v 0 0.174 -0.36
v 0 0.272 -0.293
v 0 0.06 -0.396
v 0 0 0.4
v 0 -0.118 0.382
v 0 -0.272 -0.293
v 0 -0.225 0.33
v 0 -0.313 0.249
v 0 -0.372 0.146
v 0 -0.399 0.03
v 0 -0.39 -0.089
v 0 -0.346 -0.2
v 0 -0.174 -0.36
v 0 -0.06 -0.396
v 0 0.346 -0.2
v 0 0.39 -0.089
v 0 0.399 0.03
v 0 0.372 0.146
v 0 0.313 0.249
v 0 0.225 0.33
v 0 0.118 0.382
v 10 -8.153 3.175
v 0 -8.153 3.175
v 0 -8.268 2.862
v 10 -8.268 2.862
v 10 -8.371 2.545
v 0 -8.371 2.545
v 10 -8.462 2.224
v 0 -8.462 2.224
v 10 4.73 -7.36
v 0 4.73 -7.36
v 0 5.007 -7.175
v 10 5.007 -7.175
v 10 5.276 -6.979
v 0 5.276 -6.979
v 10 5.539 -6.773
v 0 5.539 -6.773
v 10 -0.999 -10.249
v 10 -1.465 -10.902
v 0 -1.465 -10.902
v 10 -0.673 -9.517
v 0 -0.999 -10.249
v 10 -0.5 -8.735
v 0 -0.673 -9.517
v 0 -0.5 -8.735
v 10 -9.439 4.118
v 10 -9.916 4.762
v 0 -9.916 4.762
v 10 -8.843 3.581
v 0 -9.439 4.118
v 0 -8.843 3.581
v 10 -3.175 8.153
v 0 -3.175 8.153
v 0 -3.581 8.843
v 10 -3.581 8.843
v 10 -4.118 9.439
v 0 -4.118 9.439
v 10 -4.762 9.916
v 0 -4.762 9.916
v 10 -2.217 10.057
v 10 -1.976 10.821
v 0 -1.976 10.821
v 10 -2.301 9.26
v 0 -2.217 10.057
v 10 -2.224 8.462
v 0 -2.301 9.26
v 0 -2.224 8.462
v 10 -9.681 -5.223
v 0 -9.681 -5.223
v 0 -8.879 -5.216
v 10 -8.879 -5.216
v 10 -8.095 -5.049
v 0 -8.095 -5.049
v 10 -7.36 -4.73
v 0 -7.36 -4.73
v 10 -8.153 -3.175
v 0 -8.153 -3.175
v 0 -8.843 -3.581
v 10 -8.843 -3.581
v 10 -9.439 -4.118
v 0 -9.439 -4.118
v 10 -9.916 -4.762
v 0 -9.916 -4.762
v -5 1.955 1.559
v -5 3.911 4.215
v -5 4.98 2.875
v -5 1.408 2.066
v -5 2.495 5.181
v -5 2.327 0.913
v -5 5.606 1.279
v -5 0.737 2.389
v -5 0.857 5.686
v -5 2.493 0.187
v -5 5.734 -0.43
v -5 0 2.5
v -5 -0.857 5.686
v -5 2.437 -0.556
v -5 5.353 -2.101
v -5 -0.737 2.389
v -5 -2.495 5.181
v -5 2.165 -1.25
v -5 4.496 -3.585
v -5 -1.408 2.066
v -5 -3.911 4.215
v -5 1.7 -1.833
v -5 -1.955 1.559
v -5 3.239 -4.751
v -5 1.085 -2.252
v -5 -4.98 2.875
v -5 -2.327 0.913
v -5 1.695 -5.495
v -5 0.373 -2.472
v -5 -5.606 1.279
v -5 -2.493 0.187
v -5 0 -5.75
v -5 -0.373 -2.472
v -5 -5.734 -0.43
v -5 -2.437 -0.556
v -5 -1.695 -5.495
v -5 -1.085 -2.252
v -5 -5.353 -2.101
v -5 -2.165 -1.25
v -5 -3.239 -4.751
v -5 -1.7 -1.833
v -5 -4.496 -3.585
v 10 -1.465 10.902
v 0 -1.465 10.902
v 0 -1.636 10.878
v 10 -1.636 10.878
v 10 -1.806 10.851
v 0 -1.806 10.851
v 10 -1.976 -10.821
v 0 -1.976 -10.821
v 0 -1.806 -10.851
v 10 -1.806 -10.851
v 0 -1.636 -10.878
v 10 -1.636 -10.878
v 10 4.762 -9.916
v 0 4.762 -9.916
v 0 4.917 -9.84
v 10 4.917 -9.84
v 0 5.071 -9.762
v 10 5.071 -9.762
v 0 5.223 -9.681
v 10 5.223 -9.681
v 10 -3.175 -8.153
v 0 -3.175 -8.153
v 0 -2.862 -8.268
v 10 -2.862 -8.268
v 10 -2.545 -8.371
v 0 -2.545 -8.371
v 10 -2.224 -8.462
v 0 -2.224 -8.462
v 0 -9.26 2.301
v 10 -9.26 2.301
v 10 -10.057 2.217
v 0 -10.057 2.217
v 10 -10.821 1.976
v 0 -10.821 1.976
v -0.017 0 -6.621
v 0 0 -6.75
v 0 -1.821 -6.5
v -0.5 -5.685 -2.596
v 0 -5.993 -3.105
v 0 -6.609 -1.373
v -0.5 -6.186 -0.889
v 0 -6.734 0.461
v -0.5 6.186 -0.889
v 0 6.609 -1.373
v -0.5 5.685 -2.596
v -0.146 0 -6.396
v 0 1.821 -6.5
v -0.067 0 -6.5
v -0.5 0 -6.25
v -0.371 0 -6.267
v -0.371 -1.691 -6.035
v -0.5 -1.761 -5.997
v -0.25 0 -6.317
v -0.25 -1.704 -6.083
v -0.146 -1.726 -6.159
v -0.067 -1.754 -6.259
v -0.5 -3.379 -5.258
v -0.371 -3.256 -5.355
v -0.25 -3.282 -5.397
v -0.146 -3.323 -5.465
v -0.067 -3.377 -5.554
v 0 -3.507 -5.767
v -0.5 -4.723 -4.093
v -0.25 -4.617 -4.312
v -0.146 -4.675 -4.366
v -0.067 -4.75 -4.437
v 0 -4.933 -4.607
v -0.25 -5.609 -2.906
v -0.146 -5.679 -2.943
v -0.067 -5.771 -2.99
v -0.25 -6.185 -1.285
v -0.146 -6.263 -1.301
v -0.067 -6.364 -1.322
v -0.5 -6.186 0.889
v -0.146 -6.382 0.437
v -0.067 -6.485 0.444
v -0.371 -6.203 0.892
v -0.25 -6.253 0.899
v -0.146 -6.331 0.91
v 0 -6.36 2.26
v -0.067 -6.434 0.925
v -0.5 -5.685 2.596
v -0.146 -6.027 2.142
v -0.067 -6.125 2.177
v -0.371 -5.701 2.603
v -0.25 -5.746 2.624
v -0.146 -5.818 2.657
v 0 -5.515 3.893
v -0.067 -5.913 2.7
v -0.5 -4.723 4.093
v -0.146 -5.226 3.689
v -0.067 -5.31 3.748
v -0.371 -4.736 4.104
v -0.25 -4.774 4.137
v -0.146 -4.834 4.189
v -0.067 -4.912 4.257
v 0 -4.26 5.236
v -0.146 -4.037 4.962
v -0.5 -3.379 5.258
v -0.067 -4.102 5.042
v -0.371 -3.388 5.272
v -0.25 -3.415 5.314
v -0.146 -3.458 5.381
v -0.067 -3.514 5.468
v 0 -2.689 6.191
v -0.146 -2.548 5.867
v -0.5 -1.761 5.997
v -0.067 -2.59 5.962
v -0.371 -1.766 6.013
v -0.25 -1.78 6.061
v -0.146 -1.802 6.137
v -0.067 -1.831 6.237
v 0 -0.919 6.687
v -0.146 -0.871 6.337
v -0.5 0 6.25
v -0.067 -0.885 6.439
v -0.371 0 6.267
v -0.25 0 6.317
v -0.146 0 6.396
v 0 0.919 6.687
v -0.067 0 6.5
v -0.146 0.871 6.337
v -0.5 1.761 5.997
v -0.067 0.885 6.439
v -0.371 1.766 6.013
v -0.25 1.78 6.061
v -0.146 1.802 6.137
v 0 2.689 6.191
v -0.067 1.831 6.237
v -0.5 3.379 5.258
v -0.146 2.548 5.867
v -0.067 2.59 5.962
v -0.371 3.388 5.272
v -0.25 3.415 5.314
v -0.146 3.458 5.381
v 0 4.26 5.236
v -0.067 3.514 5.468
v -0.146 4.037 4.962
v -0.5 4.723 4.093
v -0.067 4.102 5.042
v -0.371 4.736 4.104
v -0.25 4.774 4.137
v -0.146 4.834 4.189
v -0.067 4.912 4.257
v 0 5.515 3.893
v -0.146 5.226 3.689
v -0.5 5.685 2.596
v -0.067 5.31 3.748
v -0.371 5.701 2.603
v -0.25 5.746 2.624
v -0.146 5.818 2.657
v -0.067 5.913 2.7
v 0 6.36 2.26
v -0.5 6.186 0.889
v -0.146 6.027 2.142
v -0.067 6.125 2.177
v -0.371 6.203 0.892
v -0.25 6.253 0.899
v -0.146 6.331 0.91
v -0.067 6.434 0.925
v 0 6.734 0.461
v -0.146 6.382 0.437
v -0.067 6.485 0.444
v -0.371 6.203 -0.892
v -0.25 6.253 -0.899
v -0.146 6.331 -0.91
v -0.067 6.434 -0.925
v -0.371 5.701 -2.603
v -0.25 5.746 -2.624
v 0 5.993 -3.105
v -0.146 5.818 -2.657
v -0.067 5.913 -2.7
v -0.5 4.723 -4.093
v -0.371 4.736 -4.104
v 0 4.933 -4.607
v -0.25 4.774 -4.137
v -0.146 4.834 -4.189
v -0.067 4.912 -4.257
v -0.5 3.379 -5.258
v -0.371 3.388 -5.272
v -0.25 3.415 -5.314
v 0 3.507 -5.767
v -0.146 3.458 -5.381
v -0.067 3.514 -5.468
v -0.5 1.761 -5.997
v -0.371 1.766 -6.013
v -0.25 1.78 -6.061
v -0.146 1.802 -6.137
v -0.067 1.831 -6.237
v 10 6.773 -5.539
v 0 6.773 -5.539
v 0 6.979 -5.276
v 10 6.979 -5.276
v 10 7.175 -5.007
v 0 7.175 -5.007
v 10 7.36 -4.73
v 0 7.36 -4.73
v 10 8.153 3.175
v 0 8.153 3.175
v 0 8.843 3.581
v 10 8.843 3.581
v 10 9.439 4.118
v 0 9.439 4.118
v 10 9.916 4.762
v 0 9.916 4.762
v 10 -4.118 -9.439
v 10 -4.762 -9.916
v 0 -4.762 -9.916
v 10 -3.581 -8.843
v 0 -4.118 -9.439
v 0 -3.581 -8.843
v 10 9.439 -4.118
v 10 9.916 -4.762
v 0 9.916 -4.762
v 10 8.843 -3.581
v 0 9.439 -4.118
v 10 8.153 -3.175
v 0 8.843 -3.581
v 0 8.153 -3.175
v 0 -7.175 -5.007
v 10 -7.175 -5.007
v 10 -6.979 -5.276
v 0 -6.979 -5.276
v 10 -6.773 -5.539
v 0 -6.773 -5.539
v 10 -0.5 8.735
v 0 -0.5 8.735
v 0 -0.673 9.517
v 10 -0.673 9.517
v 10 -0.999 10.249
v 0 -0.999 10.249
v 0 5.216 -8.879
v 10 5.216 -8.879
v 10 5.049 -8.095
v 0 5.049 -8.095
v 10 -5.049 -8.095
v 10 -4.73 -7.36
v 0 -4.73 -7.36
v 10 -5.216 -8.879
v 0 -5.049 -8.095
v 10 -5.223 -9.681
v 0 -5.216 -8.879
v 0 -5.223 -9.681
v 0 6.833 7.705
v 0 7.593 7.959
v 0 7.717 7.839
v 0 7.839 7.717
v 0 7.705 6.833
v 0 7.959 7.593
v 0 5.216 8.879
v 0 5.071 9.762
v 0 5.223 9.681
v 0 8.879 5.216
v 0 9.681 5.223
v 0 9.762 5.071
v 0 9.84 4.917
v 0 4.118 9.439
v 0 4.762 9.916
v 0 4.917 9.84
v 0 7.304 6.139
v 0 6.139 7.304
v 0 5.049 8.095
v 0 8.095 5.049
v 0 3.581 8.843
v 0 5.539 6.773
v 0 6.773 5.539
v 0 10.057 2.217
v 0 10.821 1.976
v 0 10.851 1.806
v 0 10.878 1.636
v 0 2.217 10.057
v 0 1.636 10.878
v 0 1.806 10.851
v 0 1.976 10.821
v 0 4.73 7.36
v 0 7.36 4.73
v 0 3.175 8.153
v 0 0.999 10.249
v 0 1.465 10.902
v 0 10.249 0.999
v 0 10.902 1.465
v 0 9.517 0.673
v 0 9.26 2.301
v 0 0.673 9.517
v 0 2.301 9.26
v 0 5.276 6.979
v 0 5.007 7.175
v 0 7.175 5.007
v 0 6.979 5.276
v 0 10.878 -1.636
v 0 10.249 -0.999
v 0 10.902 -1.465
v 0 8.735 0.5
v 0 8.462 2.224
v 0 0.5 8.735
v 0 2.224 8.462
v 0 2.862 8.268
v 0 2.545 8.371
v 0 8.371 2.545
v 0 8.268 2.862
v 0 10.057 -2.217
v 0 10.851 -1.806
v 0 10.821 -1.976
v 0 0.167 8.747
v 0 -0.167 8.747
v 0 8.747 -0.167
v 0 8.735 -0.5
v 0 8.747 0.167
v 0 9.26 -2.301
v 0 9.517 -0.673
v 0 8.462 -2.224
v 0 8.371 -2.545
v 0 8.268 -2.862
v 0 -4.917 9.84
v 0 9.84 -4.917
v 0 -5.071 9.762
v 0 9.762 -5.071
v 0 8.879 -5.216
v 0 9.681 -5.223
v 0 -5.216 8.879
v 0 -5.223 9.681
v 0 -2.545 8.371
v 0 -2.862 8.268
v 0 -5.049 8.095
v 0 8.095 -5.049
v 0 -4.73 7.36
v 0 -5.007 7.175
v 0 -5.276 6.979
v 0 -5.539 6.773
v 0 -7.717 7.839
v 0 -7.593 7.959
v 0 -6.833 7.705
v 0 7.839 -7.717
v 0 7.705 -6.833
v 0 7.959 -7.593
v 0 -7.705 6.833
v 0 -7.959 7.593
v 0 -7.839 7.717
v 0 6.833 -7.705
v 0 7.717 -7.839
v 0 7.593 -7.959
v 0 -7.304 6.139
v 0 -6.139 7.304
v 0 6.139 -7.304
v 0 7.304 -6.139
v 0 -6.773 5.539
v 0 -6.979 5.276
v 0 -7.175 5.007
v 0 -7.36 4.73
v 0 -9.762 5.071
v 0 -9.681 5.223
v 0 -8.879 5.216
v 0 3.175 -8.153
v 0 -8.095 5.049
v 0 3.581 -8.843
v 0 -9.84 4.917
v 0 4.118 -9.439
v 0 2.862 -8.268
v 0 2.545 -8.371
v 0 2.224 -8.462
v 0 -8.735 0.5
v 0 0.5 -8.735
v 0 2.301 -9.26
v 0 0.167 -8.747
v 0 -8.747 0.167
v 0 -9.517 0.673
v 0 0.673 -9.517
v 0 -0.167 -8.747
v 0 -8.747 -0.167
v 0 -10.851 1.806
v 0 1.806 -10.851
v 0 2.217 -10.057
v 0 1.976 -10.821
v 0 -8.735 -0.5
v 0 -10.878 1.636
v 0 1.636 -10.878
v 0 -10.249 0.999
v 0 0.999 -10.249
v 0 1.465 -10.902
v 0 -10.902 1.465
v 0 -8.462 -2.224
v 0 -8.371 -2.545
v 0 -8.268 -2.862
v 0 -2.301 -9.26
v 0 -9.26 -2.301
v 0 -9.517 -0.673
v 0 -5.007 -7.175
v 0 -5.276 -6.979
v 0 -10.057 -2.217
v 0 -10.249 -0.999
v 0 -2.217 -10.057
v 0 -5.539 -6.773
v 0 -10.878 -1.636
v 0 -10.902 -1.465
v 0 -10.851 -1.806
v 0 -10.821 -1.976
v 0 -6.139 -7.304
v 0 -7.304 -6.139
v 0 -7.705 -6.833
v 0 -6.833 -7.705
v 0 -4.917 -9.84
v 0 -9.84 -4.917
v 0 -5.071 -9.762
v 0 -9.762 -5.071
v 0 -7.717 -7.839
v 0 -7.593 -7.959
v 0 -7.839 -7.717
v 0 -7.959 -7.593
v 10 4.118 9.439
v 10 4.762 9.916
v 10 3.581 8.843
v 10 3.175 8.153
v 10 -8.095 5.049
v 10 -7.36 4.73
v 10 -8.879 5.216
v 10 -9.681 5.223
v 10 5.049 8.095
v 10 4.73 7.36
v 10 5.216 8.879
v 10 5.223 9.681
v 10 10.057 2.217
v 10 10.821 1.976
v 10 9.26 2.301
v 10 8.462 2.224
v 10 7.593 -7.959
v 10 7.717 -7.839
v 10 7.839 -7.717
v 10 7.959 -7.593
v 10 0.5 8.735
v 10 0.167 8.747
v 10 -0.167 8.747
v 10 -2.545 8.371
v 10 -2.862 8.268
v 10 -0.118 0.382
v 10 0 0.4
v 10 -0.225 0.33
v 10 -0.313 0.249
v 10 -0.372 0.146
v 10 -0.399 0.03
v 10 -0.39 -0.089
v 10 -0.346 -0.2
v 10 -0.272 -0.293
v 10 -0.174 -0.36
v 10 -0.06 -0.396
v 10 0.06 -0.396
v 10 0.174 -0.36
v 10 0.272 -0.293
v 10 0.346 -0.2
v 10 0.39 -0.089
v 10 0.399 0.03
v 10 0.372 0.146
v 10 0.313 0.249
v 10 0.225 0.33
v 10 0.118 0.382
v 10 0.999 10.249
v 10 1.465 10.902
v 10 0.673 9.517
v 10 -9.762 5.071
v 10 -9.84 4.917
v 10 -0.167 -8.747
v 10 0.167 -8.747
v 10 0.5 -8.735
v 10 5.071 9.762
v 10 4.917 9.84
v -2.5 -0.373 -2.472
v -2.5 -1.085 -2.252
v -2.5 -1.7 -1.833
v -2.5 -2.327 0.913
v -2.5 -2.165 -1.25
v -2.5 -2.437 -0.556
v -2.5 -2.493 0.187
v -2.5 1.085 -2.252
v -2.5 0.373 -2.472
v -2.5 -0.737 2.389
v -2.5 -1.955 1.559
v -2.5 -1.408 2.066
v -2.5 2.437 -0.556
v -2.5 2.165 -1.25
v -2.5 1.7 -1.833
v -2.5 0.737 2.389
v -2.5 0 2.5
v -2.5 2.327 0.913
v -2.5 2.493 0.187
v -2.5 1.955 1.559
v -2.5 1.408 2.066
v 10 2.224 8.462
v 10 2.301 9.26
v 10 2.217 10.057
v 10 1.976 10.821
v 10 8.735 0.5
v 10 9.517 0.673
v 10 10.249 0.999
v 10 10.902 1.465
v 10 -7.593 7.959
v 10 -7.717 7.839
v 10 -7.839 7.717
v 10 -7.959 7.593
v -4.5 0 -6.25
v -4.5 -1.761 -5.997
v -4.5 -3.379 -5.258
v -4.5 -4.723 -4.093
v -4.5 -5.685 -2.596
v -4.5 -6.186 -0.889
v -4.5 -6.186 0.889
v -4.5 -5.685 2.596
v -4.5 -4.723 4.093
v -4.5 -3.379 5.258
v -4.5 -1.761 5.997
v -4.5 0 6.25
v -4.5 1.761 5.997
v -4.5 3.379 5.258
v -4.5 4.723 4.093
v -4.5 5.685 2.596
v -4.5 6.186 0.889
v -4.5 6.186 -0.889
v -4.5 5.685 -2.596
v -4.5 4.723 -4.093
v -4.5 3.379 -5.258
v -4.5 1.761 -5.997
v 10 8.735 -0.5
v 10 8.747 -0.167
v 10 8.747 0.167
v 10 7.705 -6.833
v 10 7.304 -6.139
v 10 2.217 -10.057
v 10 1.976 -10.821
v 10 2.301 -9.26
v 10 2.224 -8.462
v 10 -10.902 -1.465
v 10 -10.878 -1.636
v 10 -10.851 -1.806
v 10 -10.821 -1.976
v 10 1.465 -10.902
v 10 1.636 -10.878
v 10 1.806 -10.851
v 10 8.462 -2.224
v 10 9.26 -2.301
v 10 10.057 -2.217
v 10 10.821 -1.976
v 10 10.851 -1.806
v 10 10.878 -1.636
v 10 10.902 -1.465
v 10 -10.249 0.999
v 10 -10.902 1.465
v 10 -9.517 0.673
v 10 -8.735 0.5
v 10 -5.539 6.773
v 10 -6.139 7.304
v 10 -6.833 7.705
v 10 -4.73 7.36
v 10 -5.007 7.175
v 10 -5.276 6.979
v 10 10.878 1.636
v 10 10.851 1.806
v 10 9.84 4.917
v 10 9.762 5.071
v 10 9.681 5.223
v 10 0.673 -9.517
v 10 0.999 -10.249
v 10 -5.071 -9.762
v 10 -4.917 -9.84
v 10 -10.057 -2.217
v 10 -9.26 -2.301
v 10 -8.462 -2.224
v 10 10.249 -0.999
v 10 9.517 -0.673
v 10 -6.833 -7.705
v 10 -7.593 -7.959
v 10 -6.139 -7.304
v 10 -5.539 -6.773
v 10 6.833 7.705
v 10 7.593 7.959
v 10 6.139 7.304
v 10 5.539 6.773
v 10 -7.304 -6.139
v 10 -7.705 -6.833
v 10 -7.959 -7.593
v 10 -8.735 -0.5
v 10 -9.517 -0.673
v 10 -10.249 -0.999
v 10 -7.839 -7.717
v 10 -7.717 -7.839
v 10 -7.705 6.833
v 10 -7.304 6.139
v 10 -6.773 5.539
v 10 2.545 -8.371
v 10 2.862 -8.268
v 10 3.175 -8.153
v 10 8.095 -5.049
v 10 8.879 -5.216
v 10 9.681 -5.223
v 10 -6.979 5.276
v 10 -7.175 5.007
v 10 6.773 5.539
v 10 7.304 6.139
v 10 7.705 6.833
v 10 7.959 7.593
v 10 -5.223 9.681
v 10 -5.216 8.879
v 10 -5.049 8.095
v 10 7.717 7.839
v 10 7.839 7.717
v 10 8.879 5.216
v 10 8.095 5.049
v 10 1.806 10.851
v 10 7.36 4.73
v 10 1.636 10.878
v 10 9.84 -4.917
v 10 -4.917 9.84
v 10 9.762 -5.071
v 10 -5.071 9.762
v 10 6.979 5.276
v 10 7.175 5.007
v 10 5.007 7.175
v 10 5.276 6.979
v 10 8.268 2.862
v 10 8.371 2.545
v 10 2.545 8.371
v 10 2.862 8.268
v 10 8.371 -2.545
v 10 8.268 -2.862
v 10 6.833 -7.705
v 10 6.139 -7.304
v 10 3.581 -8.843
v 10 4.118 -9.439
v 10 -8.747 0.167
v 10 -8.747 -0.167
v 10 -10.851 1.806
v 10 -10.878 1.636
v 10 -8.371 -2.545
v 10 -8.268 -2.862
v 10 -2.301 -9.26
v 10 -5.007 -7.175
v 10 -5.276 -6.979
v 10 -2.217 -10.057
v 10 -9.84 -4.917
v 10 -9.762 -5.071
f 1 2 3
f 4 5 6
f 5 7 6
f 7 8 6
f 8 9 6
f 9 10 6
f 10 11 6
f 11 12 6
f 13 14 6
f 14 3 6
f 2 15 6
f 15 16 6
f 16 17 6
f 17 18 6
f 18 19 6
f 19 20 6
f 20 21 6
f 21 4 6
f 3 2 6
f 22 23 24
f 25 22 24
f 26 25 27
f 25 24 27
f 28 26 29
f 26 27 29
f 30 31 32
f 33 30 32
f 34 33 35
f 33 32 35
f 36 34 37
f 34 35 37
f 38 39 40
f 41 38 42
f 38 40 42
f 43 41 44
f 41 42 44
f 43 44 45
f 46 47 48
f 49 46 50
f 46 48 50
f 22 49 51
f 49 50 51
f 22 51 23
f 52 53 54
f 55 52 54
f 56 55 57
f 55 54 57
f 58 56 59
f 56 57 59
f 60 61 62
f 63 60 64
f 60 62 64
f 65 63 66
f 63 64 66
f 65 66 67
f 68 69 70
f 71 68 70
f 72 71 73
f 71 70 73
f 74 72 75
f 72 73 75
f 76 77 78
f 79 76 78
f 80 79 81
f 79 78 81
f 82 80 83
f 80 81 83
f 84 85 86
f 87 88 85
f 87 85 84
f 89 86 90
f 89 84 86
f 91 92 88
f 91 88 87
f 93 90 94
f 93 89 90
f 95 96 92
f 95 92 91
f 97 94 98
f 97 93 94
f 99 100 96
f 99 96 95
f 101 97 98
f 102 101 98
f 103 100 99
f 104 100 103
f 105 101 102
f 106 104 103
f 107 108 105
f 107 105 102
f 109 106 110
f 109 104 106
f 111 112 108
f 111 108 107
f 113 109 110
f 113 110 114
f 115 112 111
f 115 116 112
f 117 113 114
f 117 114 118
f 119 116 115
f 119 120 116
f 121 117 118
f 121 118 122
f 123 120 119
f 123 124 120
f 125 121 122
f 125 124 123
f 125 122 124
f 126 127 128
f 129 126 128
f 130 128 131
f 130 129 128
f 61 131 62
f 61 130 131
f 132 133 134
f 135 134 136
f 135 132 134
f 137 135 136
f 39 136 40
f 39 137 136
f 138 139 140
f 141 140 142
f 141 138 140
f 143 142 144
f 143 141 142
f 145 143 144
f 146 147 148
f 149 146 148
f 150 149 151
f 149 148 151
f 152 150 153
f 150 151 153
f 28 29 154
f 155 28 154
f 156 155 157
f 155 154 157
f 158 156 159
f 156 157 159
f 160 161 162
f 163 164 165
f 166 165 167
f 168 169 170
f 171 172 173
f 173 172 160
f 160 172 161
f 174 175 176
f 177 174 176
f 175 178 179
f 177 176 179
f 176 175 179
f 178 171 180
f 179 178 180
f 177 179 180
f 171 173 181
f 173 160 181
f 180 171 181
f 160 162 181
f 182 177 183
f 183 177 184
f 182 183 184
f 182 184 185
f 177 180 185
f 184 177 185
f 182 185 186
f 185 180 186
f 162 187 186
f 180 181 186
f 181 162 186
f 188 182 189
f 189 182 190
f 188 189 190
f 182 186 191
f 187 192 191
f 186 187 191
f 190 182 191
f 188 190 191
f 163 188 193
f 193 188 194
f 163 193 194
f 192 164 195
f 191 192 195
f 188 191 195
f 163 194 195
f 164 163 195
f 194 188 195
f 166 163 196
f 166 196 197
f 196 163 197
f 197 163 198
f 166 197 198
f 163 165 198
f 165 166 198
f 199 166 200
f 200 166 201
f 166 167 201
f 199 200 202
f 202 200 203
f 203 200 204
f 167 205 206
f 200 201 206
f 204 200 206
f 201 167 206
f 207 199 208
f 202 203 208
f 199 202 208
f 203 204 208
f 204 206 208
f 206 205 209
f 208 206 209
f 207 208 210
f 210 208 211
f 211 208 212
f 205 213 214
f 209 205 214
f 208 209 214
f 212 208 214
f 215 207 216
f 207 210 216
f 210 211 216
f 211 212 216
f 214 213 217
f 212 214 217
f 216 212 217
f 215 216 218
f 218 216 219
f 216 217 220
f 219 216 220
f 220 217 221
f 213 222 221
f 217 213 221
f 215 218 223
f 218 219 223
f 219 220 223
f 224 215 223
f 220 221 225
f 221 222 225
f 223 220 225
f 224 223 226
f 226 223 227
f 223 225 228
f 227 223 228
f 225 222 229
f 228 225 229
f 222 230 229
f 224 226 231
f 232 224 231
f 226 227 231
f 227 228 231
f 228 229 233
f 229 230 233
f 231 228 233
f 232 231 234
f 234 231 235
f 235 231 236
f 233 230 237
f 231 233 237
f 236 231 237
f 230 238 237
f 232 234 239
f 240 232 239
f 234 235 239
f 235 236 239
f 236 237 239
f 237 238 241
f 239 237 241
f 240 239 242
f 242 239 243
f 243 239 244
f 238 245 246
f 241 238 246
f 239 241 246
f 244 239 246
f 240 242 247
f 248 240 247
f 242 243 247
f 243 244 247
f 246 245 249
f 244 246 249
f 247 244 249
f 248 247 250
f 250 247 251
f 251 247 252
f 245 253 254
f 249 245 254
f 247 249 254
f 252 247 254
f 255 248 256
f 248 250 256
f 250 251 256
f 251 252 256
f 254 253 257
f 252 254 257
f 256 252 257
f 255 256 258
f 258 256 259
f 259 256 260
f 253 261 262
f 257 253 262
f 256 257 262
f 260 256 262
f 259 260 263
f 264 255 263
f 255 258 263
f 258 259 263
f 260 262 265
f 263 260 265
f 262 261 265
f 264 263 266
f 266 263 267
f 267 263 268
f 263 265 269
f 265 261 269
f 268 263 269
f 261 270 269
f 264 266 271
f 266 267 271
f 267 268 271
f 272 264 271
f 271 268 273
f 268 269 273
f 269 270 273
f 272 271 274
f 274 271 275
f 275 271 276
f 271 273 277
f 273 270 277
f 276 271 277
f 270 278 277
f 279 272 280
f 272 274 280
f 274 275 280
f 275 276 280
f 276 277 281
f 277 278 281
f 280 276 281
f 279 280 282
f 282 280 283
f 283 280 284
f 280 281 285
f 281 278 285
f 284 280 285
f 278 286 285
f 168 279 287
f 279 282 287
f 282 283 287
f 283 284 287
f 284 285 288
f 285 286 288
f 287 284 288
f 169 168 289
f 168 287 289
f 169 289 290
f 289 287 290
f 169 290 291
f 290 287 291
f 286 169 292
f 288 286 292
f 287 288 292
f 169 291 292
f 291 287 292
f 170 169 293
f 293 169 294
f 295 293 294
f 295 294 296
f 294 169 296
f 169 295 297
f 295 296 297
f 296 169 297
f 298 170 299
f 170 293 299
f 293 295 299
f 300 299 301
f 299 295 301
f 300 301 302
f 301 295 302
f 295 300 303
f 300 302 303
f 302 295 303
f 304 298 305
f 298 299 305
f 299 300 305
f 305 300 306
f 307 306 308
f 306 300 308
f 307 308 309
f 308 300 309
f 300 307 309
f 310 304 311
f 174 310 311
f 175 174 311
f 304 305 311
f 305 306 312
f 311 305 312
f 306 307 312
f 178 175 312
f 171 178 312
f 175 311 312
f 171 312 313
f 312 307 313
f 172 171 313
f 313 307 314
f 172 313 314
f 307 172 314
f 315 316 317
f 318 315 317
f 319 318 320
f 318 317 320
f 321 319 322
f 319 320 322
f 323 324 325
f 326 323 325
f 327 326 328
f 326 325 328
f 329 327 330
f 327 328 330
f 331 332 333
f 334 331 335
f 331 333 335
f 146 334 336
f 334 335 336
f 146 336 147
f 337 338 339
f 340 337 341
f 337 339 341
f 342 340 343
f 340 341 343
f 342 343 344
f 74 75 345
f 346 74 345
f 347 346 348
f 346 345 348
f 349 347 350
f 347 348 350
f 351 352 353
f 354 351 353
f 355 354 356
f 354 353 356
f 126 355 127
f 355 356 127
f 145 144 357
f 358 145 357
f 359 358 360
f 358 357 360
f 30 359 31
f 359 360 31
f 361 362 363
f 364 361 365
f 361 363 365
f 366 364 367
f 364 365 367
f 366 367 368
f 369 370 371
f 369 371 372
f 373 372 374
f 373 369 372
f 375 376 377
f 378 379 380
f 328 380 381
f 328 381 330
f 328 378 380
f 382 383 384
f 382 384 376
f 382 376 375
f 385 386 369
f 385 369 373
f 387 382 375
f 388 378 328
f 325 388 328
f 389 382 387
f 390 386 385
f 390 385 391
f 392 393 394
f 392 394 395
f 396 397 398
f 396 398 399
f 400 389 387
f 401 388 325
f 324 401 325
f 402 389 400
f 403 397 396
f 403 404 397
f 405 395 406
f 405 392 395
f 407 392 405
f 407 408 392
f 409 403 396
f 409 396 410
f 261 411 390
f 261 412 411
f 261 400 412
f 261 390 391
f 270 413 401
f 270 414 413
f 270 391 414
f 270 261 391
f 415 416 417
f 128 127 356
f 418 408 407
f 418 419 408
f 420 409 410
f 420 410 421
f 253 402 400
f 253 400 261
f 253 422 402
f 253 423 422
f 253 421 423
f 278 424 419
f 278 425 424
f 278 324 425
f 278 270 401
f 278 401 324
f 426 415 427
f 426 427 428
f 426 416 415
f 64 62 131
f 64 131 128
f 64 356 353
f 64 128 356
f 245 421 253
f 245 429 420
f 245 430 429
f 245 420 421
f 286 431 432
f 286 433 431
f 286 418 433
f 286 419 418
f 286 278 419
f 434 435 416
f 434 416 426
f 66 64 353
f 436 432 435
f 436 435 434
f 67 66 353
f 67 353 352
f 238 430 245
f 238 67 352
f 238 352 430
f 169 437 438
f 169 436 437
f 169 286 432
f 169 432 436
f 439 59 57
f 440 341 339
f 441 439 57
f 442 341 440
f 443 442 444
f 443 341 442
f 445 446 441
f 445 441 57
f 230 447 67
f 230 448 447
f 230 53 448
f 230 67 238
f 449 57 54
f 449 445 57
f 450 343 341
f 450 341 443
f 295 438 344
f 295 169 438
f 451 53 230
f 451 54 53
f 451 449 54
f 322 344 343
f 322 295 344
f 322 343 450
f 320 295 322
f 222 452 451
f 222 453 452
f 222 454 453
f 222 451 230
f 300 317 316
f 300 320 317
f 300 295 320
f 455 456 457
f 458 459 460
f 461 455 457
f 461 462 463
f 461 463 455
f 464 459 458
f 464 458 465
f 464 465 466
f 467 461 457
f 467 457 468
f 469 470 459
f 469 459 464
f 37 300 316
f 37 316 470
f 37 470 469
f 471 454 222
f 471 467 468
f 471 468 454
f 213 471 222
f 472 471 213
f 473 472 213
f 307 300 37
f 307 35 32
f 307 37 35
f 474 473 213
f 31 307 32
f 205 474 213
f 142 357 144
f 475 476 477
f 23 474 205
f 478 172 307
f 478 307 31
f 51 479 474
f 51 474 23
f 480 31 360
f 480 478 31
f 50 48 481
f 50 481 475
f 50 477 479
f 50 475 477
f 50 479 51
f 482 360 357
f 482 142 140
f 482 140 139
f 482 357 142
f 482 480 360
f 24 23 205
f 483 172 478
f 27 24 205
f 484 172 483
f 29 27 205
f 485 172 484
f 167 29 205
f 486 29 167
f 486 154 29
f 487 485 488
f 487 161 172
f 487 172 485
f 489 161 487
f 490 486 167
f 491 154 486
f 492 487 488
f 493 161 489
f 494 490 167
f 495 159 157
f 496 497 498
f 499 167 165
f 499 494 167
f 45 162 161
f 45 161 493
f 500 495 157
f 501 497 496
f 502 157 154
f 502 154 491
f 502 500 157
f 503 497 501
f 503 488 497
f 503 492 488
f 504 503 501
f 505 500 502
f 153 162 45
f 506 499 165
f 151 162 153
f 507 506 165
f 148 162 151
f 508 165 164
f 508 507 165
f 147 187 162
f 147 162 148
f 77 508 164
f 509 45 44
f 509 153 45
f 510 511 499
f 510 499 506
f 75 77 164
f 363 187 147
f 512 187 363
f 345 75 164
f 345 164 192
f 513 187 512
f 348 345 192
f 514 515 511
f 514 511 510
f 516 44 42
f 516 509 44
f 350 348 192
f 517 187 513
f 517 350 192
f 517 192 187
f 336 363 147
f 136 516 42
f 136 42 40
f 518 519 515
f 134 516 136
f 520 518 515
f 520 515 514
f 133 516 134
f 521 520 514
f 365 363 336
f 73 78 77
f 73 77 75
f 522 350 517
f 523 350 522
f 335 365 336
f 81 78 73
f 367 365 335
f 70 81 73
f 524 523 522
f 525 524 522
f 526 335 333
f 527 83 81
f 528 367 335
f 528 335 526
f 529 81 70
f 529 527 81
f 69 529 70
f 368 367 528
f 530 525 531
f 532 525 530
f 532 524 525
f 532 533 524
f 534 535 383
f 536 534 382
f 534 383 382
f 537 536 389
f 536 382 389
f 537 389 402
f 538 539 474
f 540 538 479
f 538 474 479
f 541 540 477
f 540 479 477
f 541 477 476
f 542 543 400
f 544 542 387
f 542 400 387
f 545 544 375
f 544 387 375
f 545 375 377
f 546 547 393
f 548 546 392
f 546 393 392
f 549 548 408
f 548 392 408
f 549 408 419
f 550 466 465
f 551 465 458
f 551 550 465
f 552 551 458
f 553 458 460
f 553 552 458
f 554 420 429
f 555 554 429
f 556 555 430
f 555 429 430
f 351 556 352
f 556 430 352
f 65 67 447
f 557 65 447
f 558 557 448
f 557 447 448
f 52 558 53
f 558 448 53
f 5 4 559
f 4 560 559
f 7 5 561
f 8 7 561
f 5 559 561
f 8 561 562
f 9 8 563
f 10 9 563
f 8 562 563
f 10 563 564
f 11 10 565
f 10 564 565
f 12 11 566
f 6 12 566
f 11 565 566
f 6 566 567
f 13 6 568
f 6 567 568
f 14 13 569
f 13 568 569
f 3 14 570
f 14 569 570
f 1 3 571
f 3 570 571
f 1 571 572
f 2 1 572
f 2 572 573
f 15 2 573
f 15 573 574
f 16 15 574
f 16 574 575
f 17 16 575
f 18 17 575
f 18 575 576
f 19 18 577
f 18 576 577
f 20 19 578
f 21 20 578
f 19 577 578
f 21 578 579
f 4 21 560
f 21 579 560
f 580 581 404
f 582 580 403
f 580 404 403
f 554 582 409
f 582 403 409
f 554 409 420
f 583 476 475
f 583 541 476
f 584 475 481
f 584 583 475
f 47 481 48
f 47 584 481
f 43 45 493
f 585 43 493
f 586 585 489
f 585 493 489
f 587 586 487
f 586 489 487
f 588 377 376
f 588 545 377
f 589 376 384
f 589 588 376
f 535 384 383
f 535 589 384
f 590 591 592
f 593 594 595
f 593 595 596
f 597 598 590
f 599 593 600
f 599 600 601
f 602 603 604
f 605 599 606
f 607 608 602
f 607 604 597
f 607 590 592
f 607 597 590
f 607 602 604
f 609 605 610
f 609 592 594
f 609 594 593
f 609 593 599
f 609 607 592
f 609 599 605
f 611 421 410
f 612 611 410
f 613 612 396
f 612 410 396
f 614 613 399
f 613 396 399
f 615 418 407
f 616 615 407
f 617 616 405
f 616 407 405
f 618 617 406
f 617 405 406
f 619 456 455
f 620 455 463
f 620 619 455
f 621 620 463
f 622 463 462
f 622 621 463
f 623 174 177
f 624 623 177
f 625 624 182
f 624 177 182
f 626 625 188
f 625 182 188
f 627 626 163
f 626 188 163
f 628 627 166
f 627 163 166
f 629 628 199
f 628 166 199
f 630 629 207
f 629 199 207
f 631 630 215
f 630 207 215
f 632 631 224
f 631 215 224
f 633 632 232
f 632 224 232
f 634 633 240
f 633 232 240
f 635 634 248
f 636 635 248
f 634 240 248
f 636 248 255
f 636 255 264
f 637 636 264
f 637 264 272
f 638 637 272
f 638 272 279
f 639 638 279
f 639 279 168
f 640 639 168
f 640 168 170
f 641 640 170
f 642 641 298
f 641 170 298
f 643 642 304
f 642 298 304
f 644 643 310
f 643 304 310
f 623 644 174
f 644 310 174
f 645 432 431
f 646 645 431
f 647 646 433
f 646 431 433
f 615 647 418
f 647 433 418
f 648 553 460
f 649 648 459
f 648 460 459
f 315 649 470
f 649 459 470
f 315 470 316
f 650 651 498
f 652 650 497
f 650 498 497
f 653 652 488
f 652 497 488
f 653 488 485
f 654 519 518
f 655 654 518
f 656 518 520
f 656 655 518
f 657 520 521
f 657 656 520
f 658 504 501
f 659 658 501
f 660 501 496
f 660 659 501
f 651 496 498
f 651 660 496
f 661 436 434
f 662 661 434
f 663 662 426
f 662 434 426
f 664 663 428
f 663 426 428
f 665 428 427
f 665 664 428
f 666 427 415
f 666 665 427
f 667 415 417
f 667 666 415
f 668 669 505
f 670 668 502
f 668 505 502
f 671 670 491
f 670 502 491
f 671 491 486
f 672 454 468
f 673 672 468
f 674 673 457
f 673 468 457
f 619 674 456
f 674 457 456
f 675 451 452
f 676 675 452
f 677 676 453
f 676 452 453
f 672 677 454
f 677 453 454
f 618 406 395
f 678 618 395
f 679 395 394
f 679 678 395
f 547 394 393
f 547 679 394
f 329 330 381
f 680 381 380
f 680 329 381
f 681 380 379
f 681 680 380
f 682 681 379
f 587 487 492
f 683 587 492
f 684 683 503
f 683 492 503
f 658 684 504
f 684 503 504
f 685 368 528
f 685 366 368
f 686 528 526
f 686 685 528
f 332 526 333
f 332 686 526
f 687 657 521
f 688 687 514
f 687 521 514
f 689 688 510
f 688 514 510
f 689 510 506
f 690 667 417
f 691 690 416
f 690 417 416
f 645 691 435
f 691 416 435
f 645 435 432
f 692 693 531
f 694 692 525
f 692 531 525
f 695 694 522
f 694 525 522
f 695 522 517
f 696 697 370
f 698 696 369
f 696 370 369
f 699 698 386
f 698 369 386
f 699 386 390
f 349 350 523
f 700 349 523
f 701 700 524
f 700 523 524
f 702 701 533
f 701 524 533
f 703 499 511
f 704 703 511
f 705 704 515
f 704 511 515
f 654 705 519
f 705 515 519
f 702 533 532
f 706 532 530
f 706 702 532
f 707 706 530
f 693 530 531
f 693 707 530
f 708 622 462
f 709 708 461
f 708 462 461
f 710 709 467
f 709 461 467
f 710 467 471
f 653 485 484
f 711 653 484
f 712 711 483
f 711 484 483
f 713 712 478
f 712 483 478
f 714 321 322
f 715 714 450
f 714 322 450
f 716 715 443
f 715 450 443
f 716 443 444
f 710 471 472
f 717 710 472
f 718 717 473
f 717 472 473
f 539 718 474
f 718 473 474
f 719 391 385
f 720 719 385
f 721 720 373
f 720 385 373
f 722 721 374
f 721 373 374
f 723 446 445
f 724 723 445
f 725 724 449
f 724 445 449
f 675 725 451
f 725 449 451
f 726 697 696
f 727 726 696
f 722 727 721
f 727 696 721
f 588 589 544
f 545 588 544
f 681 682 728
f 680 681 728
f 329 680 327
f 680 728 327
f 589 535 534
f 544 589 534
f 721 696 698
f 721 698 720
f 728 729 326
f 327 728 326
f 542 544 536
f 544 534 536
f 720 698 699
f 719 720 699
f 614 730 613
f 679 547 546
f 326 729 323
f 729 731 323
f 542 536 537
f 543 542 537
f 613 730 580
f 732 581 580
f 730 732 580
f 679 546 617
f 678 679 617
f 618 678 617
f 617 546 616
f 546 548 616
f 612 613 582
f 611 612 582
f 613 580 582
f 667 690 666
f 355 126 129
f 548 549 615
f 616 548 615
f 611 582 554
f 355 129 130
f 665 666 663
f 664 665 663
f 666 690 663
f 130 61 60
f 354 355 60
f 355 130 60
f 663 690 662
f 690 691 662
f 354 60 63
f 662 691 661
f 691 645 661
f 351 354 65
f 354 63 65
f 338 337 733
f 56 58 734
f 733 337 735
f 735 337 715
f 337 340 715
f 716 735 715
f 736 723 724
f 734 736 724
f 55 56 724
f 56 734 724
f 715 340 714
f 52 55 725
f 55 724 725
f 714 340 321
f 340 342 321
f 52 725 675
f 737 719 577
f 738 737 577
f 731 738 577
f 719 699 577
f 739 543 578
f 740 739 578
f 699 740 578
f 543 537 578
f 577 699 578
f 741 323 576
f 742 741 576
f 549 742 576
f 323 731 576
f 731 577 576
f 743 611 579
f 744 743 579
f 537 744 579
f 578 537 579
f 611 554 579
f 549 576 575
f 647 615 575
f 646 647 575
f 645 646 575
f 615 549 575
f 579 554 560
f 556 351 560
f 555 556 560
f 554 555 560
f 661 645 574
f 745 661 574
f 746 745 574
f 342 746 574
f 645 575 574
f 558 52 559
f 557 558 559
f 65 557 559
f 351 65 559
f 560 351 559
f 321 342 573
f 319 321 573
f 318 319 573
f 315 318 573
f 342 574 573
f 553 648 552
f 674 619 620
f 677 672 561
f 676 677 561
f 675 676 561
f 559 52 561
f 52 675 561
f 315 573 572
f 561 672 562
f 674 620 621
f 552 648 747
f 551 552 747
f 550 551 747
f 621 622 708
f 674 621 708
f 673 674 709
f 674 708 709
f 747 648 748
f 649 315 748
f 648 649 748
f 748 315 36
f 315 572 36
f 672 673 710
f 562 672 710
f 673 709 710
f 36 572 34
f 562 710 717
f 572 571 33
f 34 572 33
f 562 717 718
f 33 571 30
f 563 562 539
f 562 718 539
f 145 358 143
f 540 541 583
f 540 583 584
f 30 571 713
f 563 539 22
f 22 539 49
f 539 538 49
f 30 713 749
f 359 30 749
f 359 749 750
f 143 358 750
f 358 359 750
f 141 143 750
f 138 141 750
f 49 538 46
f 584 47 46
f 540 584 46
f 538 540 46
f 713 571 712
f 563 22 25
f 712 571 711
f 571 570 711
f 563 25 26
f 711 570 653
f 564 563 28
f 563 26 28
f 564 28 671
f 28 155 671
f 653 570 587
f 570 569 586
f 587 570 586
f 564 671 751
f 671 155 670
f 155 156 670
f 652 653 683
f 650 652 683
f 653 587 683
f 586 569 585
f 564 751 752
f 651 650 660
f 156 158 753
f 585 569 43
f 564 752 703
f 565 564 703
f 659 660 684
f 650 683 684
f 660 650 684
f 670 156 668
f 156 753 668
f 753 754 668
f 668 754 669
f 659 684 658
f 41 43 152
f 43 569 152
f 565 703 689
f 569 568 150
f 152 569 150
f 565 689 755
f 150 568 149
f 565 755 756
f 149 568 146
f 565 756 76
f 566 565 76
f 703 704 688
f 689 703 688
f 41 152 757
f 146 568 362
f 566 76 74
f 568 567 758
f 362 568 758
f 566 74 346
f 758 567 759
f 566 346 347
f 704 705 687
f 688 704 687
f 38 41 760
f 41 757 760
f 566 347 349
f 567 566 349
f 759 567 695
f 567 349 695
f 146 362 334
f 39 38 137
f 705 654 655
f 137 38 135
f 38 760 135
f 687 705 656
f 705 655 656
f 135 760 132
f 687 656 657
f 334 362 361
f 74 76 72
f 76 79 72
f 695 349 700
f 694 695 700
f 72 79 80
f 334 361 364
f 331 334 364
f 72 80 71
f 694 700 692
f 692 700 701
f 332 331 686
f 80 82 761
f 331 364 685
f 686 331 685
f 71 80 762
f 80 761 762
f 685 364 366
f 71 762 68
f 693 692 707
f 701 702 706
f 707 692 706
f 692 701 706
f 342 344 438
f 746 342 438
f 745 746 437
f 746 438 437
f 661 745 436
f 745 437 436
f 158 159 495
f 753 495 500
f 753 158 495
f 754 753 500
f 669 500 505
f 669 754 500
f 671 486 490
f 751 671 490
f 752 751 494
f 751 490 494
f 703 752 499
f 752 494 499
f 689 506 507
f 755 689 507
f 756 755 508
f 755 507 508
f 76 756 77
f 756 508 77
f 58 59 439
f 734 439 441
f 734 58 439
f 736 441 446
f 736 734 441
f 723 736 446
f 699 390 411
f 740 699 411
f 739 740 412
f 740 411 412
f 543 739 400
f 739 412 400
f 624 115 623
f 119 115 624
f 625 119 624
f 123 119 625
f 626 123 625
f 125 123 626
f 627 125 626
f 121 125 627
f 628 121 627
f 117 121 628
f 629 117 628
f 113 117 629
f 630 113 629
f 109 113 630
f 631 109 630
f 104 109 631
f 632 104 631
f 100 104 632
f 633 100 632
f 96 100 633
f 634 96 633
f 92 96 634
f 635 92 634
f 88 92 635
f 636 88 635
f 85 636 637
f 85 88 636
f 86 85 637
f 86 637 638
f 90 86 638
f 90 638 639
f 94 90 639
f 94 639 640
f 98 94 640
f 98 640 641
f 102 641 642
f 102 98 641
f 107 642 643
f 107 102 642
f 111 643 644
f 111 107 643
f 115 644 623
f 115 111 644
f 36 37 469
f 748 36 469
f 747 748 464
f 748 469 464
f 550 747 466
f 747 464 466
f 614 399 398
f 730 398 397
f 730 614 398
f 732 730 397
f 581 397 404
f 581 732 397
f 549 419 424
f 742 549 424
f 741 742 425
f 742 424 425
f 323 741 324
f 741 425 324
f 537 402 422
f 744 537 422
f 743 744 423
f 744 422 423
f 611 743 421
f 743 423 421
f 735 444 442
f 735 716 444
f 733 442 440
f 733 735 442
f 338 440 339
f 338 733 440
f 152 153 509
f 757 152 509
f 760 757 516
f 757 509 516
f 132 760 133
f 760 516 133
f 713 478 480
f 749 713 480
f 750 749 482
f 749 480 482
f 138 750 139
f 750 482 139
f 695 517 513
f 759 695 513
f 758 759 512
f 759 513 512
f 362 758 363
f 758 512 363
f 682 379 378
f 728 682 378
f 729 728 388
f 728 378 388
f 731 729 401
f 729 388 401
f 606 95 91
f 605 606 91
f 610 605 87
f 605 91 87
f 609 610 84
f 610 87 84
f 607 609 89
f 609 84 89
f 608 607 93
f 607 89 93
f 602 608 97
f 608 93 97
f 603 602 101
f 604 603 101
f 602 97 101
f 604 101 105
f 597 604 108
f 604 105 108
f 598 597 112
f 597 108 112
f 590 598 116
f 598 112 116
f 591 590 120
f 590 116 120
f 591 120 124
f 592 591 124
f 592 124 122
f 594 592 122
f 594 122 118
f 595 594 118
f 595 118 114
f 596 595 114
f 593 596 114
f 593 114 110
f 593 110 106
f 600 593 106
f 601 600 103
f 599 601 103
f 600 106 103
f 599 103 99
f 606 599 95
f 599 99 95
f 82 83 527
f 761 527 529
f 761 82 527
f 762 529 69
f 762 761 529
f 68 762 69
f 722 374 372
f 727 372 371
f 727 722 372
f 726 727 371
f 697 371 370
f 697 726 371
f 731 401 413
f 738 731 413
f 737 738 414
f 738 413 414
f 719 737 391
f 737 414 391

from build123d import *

# Parameters (mm, degrees)
BASPROSKE_W         = 10
BASPROSKE_H         = 11
TOOTHCUT_DEPTH      = 19.493242009
TEETHCUTS_COUNT     = 20
TEETHCUTS_ANGLE     = 342
BORSKE_R            = 0.4
BORE_DEPTH          = 50.0000508
SKETCH1_R           = 6.25
BOSS_EXTRUDE1_DEPTH = 5
FILLET1_R           = 0.5
CHAMFER1_SIZE       = 0.5
SKETCH4_R           = 2.5
CUT_EXTRUDE1_DEPTH  = 2.5


with BuildPart() as part:
    # BasProSke → Base-Revolve (revolve)
    with BuildSketch(Plane(origin=(0, 0, 0), x_dir=(1, 0, 0), z_dir=(0, 1, 0)), mode=Mode.PRIVATE) as base_revolve_sk:
        with Locations((5, 5.5)):
            Rectangle(BASPROSKE_W, BASPROSKE_H)
    revolve(base_revolve_sk.sketch.rotate(Axis((-10, 0, 0), (1, 0, 0)), 180), axis=Axis((-10, 0, 0), (1, 0, 0)))

    # TooCutSke → ToothCut (cut, through all)
    with BuildSketch(Plane(origin=(0, 0, 0), x_dir=(0, 0, -1), z_dir=(1, 0, 0))):
        with BuildLine():
            ThreePointArc((0.499924007, 8.734705318), (0, 8.749), (-0.499924007, 8.734705318))
            ThreePointArc((-0.499924007, 8.734705318), (-0.824302243, 9.905497836), (-1.485192705, 10.924909509))
            ThreePointArc((-1.485192705, 10.924909509), (0, 11.0254), (1.485192705, 10.924909509))
            ThreePointArc((1.485192705, 10.924909509), (0.824302243, 9.905497836), (0.499924007, 8.734705318))
        make_face()
    toothcut = extrude(amount=TOOTHCUT_DEPTH, mode=Mode.SUBTRACT)

    # TeethCuts: ToothCut ×20 about axis
    teethcuts_axis = Axis((-10, 0, 0), (1, 0, 0))
    for i in range(1, TEETHCUTS_COUNT):
        add(toothcut.rotate(teethcuts_axis, i * TEETHCUTS_ANGLE / (TEETHCUTS_COUNT - 1)), mode=Mode.SUBTRACT)

    # BorSke → Bore (cut, symmetric)
    with BuildSketch(Plane(origin=(0, 0, 0), x_dir=(0, 0, -1), z_dir=(1, 0, 0))):
        with Locations(Location((0, 0, 0), (0, 0, 180))):
            Circle(BORSKE_R)
    extrude(amount=BORE_DEPTH, both=True, mode=Mode.SUBTRACT)

    # Sketch1 → Boss-Extrude1 (add)
    with BuildSketch(Plane.ZY):
        with Locations(Location((0, 0, 0), (0, 0, 180))):
            Circle(SKETCH1_R)
    extrude(amount=BOSS_EXTRUDE1_DEPTH)

    # Fillet1
    fillet1_edges = [part.edges().sort_by_distance(p)[0] for p in [
        (0, 0, 6.25),
    ]]
    fillet(fillet1_edges, radius=FILLET1_R)

    # Chamfer1
    chamfer1_edges = [part.edges().sort_by_distance(p)[0] for p in [
        (-5, 0, 6.25),
    ]]
    chamfer(chamfer1_edges, length=CHAMFER1_SIZE)

    # Sketch4 → Cut-Extrude1 (cut)
    with BuildSketch(Plane.ZY.offset(5)):
        Circle(SKETCH4_R)
    extrude(amount=-CUT_EXTRUDE1_DEPTH, mode=Mode.SUBTRACT)


solid = part.part
